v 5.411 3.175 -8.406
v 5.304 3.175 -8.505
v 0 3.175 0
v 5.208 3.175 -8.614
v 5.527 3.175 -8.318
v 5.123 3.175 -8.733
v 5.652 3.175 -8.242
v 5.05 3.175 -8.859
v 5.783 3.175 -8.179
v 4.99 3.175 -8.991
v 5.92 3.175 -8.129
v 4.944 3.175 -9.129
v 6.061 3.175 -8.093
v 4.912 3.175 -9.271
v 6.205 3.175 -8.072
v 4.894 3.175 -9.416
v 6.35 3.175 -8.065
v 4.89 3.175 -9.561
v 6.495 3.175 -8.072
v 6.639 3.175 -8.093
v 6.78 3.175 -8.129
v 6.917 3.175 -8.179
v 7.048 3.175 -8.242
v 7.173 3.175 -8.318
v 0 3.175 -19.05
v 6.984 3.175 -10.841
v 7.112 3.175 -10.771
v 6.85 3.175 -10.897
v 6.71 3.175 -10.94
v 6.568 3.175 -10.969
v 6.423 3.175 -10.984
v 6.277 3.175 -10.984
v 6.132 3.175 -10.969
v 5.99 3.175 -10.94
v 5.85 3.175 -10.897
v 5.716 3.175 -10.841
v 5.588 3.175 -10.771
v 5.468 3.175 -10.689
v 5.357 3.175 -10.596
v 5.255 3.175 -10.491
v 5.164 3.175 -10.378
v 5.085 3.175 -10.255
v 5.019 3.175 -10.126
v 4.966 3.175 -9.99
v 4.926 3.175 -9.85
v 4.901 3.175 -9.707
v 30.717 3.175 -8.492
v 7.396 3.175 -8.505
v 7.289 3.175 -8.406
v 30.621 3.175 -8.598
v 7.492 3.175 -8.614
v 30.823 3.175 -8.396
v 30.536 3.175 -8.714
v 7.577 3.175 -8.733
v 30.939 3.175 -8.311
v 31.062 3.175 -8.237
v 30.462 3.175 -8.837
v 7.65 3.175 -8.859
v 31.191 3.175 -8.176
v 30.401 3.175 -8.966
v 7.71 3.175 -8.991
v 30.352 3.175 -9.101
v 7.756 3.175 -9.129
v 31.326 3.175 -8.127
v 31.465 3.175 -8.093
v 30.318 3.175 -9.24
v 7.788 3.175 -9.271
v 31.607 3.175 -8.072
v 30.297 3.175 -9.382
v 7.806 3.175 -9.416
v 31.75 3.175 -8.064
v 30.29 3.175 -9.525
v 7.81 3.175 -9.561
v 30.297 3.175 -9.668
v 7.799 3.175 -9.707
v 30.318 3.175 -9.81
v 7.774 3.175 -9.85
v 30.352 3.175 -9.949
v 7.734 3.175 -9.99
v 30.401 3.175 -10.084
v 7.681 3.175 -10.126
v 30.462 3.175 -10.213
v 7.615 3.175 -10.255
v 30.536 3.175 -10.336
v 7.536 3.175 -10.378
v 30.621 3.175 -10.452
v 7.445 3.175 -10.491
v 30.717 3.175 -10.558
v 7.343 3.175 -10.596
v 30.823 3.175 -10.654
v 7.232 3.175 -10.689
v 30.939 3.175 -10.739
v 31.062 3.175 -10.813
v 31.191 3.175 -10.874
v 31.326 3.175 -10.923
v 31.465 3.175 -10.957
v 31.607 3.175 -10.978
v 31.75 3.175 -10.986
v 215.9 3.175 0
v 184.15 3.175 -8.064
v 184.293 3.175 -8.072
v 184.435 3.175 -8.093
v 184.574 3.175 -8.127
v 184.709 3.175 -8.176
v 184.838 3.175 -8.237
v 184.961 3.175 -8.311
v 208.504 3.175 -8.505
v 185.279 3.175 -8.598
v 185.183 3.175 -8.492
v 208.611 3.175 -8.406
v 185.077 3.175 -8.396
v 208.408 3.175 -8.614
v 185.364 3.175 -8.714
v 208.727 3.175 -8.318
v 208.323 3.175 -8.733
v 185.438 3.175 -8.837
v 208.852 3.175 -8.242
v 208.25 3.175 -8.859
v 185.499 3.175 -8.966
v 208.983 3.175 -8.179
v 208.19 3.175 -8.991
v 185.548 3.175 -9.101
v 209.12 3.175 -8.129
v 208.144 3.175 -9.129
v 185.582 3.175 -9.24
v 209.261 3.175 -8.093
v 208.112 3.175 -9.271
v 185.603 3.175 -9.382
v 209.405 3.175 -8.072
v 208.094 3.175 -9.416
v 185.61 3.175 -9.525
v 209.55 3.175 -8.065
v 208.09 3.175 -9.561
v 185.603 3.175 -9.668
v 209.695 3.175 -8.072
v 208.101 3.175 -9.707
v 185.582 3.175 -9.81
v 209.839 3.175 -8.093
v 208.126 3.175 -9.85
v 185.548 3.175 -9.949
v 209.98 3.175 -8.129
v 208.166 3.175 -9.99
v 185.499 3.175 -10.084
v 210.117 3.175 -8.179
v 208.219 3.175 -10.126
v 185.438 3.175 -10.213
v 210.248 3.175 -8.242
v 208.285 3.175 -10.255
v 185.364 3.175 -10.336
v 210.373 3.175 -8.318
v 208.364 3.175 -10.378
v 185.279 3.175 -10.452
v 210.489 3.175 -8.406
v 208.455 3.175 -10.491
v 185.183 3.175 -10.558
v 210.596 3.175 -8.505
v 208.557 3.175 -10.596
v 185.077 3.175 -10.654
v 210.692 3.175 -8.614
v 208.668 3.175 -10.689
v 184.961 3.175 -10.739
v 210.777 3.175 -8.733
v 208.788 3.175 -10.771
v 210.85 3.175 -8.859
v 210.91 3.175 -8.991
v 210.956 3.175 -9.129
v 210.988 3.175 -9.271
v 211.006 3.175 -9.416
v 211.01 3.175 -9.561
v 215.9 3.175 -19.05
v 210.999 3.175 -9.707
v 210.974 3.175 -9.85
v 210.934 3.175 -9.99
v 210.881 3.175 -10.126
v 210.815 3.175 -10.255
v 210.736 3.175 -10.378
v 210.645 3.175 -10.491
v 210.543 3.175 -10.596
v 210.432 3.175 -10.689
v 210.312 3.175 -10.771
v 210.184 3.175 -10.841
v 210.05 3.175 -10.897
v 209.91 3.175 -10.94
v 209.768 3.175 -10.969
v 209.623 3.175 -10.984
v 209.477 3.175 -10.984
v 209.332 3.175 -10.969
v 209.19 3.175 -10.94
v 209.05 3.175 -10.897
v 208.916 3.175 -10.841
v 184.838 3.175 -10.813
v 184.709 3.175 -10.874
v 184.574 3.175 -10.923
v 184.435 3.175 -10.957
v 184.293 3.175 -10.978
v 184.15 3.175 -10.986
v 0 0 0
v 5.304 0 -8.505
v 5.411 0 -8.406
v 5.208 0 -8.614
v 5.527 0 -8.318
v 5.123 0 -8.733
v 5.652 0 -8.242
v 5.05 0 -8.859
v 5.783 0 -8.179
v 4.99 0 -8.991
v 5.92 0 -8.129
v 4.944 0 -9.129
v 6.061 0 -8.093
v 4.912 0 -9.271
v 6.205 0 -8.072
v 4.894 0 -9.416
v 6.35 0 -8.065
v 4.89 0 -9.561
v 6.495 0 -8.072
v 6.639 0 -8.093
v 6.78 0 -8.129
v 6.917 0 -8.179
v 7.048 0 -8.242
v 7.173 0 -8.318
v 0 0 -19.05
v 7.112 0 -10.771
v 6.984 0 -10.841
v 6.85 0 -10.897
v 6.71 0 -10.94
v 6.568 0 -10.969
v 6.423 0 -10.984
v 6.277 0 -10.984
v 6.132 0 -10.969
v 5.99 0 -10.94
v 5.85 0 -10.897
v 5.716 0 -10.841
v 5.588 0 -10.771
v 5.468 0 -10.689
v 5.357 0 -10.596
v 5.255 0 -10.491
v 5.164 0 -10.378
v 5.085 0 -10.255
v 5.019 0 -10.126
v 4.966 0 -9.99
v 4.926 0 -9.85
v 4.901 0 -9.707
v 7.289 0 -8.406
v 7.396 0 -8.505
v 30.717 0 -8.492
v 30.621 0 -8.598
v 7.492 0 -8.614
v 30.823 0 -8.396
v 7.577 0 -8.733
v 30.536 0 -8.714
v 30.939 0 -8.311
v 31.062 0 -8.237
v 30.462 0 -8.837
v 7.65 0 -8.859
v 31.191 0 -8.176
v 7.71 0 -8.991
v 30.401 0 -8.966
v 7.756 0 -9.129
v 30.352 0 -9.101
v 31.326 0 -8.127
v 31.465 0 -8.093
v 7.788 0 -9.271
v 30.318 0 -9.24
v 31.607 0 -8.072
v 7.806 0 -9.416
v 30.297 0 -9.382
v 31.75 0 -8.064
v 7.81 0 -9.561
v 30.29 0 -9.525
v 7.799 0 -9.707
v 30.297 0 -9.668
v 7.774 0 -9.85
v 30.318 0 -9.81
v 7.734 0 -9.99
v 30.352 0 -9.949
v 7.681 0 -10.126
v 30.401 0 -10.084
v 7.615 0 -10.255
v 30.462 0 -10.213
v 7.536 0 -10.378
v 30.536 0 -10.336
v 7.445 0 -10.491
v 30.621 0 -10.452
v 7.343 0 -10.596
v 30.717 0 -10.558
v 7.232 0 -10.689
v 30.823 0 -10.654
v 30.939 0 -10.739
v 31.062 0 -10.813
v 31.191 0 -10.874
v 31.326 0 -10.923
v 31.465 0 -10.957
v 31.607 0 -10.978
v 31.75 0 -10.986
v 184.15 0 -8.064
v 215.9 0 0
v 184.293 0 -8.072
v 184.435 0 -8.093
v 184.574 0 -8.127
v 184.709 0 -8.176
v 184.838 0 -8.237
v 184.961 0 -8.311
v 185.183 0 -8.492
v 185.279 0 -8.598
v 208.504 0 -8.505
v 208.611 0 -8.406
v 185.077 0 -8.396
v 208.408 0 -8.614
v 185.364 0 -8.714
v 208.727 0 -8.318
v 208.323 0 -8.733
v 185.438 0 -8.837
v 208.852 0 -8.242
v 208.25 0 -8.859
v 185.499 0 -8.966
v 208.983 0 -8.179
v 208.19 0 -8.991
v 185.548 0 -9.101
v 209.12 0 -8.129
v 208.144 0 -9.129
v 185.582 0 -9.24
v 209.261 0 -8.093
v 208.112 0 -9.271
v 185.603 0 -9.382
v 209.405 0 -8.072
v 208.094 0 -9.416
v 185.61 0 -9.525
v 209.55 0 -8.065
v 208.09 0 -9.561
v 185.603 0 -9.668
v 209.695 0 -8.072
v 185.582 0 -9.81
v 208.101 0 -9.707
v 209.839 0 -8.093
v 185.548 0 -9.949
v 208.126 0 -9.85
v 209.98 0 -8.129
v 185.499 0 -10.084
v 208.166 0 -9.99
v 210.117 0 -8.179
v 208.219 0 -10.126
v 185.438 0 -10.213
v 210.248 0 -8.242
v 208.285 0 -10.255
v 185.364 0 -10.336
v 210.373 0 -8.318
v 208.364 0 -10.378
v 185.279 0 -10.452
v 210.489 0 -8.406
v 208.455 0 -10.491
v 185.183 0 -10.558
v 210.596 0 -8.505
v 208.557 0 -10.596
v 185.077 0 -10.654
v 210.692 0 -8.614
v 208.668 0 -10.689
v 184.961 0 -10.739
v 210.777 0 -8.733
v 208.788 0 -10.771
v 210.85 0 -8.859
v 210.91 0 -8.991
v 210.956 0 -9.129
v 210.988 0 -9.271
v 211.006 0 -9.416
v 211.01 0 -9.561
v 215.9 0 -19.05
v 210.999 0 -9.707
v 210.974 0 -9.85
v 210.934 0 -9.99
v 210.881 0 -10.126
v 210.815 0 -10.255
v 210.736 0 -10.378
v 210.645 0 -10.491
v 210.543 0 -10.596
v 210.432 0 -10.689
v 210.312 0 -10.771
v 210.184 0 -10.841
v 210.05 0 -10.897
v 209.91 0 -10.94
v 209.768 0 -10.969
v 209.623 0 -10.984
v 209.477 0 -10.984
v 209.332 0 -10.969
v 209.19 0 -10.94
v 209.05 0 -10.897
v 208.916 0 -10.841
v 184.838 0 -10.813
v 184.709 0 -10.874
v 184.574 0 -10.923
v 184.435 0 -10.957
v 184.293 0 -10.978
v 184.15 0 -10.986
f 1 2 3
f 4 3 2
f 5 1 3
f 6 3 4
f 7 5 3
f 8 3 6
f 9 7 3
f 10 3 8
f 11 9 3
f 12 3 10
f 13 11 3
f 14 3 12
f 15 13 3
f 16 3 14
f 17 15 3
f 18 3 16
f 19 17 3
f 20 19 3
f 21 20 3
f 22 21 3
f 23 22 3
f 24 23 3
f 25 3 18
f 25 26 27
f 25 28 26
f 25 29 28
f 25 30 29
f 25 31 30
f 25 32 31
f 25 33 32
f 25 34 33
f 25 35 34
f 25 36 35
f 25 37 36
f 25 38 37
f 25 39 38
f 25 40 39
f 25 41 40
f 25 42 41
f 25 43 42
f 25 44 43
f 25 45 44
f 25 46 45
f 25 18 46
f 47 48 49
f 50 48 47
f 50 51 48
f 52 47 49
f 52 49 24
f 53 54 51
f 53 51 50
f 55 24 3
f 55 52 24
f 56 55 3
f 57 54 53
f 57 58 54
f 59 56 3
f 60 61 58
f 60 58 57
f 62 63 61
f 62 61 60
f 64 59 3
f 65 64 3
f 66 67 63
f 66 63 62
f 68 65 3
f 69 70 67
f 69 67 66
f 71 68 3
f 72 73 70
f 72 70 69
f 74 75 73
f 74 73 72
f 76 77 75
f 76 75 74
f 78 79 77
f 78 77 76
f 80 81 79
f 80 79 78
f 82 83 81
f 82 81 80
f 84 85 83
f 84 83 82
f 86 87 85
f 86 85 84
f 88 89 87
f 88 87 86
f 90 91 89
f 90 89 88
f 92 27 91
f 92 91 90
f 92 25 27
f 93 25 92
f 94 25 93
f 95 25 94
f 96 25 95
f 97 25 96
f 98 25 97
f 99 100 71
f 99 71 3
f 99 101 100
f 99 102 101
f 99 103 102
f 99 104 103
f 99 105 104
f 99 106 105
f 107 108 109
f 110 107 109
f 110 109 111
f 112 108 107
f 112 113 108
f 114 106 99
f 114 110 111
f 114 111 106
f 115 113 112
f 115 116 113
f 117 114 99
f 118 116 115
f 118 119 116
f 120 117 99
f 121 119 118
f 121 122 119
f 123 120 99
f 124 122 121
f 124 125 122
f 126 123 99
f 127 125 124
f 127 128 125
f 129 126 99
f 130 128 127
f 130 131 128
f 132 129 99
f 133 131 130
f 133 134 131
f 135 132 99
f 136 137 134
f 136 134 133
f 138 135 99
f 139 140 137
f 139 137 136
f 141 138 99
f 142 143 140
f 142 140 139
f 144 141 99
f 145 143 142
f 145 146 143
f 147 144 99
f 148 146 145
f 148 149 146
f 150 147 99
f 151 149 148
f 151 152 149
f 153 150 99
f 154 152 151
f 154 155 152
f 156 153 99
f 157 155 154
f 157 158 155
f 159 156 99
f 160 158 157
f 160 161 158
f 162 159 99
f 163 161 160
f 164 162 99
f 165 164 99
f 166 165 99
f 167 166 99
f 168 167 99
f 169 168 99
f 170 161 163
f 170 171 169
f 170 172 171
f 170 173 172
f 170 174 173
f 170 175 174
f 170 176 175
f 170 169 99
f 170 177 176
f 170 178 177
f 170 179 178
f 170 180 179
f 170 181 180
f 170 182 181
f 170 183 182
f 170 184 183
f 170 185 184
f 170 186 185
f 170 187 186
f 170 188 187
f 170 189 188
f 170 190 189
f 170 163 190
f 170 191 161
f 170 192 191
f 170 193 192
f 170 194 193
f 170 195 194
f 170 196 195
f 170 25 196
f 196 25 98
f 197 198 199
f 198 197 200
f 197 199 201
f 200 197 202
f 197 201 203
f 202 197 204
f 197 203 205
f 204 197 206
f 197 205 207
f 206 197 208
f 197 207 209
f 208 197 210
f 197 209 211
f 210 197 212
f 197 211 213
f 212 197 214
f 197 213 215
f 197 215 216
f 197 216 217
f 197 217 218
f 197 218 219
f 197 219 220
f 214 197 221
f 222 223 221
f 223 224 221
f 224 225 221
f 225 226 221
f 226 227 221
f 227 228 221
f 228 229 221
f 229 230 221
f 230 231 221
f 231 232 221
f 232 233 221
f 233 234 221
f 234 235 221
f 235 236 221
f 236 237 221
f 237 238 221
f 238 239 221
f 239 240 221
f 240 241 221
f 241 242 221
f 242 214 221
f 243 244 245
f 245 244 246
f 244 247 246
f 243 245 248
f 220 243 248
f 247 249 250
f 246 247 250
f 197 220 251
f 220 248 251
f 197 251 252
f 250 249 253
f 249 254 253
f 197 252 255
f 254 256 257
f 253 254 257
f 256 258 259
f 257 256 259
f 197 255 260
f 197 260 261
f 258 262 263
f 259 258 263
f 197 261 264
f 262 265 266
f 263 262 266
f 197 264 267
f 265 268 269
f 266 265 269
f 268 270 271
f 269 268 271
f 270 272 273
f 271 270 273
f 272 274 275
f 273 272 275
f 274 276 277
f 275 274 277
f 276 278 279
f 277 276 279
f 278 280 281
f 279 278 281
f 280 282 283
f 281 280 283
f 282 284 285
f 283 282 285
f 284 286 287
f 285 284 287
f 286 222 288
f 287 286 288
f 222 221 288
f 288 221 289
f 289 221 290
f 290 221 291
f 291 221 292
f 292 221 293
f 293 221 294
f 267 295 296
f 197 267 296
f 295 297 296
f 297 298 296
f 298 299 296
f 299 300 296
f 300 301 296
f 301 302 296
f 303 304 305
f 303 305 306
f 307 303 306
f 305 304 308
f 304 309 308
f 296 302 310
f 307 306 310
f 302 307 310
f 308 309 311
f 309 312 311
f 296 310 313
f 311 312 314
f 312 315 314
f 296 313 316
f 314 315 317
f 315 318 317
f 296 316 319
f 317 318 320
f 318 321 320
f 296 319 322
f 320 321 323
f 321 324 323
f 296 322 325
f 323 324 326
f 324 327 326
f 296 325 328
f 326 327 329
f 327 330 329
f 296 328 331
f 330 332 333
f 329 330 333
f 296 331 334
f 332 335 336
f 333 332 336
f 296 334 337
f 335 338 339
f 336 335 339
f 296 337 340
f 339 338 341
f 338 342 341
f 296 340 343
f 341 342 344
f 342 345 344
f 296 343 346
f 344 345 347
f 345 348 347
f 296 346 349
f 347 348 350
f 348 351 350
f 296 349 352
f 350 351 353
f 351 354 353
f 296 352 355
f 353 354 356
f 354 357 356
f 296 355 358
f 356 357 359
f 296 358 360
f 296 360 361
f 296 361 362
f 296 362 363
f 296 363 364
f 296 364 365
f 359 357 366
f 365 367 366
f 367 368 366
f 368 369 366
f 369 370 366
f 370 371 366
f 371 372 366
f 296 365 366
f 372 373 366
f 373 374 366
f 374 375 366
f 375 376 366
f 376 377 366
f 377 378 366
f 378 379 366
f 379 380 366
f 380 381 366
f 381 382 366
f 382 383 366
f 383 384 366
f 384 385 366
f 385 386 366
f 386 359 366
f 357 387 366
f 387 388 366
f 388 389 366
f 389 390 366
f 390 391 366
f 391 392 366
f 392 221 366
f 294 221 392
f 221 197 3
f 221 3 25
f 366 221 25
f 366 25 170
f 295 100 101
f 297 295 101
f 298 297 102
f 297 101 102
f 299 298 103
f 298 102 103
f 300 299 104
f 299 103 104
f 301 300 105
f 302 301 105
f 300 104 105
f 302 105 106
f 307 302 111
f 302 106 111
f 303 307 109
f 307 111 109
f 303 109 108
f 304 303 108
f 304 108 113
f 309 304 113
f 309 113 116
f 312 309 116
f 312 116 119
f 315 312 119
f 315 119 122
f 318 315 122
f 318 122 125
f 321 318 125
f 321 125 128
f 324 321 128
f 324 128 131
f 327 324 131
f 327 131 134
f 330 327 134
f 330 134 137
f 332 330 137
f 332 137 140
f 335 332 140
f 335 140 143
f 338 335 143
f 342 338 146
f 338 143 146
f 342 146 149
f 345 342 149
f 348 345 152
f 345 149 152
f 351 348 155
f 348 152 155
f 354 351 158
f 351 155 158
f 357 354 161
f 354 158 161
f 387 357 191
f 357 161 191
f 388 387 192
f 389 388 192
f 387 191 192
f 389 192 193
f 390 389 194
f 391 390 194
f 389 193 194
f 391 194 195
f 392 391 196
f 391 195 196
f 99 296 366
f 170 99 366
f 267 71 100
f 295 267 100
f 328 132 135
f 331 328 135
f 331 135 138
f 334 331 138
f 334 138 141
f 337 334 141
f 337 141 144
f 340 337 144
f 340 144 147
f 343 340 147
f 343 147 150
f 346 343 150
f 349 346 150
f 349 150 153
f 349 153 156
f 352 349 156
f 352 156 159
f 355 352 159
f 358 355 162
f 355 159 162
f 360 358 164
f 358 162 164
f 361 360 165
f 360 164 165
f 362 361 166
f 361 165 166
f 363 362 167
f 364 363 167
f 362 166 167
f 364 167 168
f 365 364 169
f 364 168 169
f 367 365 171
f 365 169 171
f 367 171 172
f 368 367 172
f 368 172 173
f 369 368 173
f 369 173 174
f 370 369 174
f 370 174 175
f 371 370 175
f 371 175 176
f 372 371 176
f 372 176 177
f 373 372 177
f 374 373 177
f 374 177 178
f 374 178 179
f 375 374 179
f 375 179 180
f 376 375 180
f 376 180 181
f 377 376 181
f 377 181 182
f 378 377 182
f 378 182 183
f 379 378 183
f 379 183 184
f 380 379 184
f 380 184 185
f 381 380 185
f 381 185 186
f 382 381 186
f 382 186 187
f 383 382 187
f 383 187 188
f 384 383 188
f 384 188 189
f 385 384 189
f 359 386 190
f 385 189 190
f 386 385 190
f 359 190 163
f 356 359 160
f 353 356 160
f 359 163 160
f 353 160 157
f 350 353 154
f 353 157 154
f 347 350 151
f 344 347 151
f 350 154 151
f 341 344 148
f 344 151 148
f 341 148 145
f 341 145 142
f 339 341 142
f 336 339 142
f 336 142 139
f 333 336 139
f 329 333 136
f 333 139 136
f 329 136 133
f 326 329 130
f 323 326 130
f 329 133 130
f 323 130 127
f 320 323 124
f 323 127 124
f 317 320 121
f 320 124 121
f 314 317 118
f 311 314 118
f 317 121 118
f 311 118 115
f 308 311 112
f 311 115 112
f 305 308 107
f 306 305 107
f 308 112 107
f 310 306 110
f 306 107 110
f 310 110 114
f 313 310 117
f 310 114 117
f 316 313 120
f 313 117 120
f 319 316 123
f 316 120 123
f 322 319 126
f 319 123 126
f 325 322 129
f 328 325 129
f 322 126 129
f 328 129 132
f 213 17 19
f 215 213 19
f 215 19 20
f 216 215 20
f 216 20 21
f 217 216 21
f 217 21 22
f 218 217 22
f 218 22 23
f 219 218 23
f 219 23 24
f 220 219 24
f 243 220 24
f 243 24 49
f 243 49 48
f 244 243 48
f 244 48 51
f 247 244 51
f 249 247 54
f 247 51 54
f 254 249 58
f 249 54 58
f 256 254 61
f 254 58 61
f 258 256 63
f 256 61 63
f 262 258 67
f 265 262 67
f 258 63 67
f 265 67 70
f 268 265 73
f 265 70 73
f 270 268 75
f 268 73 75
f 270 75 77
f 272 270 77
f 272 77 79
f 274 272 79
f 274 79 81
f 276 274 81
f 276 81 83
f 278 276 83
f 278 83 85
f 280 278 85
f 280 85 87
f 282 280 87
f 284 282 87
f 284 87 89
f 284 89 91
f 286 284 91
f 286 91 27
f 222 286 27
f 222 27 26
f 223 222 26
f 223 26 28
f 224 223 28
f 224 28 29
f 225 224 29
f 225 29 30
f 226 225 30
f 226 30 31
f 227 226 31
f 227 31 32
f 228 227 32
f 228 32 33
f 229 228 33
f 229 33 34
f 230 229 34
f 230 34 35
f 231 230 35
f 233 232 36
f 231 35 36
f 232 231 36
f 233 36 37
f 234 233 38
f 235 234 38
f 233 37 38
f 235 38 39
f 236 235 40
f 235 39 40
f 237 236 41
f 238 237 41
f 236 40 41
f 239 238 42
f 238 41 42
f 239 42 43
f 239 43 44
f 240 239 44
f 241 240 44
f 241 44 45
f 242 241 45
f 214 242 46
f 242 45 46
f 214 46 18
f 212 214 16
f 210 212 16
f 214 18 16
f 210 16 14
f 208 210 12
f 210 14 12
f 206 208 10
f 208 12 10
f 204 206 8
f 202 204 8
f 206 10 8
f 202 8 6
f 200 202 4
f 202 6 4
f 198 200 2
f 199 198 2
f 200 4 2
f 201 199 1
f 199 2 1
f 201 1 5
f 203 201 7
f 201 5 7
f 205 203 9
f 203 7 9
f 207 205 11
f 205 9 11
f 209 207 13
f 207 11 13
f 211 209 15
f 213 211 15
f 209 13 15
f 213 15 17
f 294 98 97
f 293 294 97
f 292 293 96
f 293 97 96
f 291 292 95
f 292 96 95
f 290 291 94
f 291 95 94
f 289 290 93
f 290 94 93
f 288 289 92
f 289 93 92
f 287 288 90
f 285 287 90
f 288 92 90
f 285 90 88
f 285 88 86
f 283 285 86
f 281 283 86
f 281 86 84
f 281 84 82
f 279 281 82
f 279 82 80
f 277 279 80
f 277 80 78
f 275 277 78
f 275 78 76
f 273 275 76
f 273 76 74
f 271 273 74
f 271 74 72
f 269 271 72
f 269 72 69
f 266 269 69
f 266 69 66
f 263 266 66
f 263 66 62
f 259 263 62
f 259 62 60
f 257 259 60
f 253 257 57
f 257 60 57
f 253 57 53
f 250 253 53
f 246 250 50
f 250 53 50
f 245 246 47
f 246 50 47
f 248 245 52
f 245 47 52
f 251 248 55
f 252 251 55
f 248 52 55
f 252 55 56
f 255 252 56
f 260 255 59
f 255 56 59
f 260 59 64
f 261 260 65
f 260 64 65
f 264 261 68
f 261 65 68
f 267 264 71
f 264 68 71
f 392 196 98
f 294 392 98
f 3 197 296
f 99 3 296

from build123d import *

# Parameters (mm, degrees)
SKETCH1_W           = 215.9
SKETCH1_H           = 19.05
BOSS_EXTRUDE1_DEPTH = 3.175
SKETCH3_R           = 1.4605
CUT_EXTRUDE5_DEPTH  = 217.762065696


with BuildPart() as part:
    # Sketch1 → Boss-Extrude1 (new body)
    with BuildSketch(Plane(origin=(0, 0, 0), x_dir=(1, 0, 0), z_dir=(0, 1, 0))):
        with Locations((107.95, 9.525)):
            Rectangle(SKETCH1_W, SKETCH1_H)
    extrude(amount=BOSS_EXTRUDE1_DEPTH)

    # Sketch3 → Cut-Extrude5 (cut, through all)
    with BuildSketch(Plane(origin=(0, 3.175, 0), x_dir=(1, 0, 0), z_dir=(0, 1, 0))):
        with BuildLine():
            Line((184.15, 10.9855), (31.75, 10.9855))
            ThreePointArc((31.75, 10.9855), (30.2895, 9.525), (31.75, 8.0645))
            Line((31.75, 8.0645), (184.15, 8.0645))
            ThreePointArc((184.15, 8.0645), (185.6105, 9.525), (184.15, 10.9855))
        make_face()
        with Locations(Location((6.35, 9.525, 0), (0, 0, 270))):
            Circle(SKETCH3_R)
        with Locations(Location((209.55, 9.525, 0), (0, 0, 270))):
            Circle(SKETCH3_R)
    extrude(amount=-CUT_EXTRUDE5_DEPTH, mode=Mode.SUBTRACT)


solid = part.part
